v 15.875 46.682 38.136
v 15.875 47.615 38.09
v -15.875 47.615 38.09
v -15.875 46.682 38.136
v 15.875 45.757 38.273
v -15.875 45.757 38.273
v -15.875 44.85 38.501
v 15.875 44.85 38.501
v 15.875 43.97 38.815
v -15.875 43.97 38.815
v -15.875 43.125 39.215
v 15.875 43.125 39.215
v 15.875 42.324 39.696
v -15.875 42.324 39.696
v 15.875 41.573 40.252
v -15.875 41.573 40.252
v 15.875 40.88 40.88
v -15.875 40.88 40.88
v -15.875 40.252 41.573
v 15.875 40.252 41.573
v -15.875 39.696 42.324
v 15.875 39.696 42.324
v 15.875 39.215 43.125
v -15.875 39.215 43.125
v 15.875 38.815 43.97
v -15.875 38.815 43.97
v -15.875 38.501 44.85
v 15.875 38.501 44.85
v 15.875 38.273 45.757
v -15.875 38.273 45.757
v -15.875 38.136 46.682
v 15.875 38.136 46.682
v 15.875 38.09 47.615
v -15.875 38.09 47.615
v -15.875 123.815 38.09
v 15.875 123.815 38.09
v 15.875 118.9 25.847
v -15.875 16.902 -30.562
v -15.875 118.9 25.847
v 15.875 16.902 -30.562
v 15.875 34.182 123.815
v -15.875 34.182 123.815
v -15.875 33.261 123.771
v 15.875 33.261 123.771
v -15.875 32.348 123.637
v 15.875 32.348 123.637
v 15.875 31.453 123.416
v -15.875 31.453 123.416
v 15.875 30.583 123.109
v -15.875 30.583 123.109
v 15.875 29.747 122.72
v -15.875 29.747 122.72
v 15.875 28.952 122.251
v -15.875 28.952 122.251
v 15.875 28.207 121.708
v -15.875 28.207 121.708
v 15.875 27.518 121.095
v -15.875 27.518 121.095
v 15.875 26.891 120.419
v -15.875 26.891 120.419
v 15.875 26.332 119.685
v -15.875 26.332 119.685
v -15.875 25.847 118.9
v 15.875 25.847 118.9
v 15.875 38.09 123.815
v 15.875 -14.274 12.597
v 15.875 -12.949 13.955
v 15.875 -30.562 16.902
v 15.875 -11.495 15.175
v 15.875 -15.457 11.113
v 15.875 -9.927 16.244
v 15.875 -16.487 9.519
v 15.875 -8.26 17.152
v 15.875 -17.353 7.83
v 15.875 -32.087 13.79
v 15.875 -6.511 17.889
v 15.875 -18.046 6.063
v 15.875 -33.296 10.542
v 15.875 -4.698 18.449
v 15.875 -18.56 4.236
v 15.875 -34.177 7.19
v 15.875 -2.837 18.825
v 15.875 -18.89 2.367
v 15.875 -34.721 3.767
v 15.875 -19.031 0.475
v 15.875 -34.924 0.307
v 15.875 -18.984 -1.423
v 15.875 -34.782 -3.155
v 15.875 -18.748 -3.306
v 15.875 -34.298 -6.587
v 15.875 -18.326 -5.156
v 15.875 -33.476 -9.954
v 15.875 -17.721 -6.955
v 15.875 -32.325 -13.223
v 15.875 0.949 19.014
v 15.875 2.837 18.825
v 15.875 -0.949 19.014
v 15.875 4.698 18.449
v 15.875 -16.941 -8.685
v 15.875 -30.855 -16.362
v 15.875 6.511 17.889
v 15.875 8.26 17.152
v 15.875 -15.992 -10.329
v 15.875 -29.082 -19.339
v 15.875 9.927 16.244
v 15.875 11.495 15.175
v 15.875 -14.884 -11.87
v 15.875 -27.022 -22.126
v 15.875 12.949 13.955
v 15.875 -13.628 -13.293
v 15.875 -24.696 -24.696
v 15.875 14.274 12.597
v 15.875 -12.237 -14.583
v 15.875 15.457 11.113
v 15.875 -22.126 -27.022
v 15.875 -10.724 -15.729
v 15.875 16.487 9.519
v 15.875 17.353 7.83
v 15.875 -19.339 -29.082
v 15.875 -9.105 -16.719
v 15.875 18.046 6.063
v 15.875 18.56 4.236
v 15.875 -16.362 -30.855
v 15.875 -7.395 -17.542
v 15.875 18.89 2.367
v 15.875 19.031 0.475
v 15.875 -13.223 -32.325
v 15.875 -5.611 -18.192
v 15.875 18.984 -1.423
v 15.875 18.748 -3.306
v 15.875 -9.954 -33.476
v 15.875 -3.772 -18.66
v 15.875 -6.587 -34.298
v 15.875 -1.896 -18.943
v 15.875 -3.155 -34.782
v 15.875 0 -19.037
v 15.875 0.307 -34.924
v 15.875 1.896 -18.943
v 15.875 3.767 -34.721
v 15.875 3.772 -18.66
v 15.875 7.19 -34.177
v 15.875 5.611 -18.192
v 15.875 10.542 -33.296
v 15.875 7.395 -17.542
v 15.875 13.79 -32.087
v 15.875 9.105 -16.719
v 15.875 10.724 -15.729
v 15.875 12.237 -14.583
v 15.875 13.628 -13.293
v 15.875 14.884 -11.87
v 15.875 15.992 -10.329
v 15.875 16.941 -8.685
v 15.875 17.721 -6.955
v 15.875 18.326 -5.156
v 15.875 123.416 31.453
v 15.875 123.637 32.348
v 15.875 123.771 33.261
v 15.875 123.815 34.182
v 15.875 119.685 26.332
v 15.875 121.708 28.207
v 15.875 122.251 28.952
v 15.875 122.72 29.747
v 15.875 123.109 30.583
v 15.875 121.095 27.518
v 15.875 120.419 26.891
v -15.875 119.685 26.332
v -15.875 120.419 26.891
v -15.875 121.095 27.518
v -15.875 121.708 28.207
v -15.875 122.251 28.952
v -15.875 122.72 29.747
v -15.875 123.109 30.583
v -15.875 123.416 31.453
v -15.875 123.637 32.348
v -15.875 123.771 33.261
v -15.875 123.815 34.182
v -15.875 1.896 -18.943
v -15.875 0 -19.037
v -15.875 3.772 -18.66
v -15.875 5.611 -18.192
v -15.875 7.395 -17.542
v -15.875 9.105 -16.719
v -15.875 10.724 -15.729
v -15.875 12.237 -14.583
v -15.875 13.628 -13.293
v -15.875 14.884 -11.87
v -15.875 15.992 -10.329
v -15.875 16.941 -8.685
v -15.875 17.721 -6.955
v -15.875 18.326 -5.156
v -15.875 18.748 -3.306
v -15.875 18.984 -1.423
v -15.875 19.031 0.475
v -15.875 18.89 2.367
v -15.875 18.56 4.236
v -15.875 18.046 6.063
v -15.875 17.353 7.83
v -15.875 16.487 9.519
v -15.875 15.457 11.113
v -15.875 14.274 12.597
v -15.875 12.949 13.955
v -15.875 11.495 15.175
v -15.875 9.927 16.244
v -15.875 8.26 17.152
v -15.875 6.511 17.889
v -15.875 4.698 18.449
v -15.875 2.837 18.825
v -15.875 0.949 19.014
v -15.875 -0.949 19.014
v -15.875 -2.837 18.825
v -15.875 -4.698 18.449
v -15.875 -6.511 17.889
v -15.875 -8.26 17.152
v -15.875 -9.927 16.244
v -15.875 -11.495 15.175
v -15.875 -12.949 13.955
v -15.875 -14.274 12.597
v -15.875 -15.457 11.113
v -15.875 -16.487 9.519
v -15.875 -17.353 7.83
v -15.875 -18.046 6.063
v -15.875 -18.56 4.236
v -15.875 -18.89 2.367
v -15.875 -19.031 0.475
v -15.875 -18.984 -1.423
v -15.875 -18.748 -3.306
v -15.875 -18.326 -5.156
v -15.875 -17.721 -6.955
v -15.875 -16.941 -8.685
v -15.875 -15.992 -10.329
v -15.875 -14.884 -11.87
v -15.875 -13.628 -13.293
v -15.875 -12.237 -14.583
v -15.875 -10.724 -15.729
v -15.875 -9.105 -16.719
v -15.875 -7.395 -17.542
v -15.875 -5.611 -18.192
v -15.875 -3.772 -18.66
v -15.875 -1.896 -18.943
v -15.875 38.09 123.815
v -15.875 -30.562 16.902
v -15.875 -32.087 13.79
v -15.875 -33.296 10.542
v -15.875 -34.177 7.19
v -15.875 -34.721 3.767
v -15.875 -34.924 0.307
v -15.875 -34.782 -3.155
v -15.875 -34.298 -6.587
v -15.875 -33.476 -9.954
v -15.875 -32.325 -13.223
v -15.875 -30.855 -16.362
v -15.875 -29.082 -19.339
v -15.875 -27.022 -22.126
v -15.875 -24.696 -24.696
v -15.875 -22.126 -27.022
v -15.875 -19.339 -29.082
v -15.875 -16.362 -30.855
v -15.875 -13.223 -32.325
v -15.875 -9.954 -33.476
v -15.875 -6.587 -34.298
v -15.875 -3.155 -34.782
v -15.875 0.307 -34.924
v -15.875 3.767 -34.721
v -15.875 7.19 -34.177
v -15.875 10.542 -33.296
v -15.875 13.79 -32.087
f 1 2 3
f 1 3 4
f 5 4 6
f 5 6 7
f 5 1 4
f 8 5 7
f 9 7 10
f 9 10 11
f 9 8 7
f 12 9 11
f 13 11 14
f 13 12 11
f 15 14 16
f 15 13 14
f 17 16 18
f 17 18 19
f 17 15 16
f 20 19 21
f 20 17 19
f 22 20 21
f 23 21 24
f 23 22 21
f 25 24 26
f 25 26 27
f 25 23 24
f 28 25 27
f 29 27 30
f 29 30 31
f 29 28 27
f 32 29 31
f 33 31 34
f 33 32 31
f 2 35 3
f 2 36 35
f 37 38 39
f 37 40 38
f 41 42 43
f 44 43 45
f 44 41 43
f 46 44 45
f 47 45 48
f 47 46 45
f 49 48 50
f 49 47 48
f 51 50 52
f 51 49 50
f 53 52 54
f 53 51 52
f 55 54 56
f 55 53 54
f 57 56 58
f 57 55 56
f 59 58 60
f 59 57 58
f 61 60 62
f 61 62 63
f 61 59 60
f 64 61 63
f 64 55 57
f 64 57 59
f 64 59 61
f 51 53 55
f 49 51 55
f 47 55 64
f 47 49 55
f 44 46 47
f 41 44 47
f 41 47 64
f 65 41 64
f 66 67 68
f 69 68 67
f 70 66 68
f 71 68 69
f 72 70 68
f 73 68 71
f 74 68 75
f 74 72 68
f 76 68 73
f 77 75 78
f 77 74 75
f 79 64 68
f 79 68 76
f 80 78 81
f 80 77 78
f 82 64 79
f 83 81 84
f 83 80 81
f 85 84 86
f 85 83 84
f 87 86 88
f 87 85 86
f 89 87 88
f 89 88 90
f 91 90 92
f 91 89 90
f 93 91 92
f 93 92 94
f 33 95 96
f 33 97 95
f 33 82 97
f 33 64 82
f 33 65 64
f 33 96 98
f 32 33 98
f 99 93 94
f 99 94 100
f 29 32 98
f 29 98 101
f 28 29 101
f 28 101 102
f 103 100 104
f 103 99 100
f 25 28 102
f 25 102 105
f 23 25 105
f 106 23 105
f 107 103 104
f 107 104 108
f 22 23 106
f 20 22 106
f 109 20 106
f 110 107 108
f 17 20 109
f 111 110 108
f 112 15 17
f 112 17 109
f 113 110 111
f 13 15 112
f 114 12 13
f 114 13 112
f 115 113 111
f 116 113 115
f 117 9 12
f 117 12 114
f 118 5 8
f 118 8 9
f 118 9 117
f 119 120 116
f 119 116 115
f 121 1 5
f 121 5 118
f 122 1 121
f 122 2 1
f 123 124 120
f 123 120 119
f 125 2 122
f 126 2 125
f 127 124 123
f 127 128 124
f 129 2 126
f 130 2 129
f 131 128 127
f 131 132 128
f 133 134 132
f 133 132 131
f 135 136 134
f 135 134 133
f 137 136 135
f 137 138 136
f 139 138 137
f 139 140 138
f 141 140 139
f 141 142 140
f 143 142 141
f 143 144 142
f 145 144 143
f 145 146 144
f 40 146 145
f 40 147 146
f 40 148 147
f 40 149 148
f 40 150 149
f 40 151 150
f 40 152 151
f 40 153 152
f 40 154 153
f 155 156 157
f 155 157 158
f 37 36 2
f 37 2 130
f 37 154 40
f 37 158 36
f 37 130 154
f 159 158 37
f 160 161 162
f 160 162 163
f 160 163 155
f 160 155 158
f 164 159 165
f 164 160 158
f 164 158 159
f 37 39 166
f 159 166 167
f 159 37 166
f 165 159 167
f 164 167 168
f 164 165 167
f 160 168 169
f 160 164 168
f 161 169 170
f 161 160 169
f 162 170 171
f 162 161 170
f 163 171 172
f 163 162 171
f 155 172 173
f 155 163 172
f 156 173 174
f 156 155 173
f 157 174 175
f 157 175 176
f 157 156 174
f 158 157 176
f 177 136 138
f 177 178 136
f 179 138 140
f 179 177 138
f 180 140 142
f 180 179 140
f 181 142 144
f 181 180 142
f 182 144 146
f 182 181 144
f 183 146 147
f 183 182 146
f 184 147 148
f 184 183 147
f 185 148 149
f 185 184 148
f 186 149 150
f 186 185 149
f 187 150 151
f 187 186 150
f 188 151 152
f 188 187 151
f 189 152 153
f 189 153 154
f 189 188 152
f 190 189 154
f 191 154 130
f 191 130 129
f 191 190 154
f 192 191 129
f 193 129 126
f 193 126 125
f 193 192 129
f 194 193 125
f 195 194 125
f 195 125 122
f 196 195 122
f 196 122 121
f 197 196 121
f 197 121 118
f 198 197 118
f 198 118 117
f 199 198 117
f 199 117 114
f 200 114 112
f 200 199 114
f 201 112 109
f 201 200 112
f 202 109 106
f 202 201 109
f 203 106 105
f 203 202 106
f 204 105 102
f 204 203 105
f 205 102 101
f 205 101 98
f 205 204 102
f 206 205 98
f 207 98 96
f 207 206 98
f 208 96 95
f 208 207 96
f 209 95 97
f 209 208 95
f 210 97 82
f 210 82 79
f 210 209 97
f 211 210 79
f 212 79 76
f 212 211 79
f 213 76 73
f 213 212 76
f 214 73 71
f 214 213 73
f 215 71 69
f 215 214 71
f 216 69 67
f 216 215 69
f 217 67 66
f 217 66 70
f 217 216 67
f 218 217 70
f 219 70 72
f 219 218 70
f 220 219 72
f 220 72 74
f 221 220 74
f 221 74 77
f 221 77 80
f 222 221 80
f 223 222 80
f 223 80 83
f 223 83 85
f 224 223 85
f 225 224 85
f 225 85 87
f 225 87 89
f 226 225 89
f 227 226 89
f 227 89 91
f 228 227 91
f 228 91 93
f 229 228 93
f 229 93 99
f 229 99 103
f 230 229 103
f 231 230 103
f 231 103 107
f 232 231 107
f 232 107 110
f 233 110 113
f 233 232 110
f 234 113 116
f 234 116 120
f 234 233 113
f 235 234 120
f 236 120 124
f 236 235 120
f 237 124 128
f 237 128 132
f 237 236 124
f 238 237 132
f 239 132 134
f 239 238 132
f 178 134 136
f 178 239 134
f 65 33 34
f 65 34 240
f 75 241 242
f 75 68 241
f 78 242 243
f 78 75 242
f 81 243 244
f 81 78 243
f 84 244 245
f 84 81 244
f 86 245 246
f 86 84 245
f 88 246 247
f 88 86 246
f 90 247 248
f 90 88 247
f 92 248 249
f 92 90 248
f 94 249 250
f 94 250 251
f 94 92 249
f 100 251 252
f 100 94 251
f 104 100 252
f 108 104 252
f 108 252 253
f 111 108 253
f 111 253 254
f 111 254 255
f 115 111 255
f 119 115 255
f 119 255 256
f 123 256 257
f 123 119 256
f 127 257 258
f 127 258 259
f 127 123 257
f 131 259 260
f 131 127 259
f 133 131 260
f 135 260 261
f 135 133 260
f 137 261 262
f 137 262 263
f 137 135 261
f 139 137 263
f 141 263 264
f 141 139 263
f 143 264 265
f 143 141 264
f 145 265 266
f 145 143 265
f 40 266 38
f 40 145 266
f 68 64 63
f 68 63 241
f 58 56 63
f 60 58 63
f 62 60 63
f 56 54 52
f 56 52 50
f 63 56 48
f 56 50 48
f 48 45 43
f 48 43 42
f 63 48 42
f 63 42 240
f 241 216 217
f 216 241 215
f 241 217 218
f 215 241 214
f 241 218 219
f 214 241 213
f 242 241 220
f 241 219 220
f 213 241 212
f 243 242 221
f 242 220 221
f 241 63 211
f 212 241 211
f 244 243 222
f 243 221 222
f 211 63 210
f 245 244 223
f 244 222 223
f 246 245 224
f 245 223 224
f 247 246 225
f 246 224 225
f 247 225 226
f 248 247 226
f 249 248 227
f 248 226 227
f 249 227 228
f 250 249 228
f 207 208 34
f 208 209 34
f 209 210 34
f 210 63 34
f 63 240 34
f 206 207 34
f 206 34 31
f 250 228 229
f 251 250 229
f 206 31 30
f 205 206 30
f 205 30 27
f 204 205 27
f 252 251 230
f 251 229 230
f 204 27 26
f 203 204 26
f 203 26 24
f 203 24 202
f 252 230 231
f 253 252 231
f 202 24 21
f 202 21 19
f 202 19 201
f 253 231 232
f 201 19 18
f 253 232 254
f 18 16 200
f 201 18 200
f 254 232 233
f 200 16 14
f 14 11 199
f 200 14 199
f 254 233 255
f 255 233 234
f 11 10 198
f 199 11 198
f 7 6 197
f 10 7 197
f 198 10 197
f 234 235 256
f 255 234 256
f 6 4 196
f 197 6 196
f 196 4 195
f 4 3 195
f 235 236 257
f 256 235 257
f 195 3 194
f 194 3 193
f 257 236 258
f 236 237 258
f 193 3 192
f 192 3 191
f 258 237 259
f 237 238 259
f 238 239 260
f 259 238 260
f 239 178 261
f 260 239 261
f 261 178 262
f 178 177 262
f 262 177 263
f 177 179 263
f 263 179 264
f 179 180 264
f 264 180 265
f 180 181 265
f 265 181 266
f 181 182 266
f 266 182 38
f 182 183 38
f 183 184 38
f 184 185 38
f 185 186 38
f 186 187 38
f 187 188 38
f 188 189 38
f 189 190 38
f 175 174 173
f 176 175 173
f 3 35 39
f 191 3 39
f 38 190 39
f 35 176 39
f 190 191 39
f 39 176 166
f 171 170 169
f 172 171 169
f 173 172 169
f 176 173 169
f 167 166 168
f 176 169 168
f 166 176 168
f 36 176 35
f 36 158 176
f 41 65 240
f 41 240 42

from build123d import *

# Parameters (mm, degrees)
SKETCH1_R          = 19.0373
BASE_EXTRUDE_DEPTH = 15.875


with BuildPart() as part:
    # Sketch1 → Base-Extrude (new, symmetric)
    with BuildSketch(Plane(origin=(0, 0, 0), x_dir=(0, 0, -1), z_dir=(1, 0, 0))):
        with BuildLine():
            Line((-38.090421481, 123.815421481), (-38.090421481, 47.615421481))
            ThreePointArc((-38.090421481, 47.615421481), (-40.880229391, 40.880229391), (-47.615421481, 38.090421481))
            Line((-47.615421481, 38.090421481), (-123.815421481, 38.090421481))
            Line((-123.815421481, 38.090421481), (-123.815421481, 34.182275097))
            ThreePointArc((-123.815421481, 34.182275097), (-122.495102851, 29.344007988), (-118.900181875, 25.847064595))
            Line((-118.900181875, 25.847064595), (-16.902454778, -30.562438507))
            ThreePointArc((-16.902454778, -30.562438507), (24.695704333, -24.695704333), (30.562438507, 16.902454778))
            Line((30.562438507, 16.902454778), (-25.847064595, 118.900181875))
            ThreePointArc((-25.847064595, 118.900181875), (-29.344007988, 122.495102851), (-34.182275097, 123.815421481))
            Line((-34.182275097, 123.815421481), (-38.090421481, 123.815421481))
        make_face()
        Circle(SKETCH1_R, mode=Mode.SUBTRACT)
    extrude(amount=BASE_EXTRUDE_DEPTH, both=True)


solid = part.part
